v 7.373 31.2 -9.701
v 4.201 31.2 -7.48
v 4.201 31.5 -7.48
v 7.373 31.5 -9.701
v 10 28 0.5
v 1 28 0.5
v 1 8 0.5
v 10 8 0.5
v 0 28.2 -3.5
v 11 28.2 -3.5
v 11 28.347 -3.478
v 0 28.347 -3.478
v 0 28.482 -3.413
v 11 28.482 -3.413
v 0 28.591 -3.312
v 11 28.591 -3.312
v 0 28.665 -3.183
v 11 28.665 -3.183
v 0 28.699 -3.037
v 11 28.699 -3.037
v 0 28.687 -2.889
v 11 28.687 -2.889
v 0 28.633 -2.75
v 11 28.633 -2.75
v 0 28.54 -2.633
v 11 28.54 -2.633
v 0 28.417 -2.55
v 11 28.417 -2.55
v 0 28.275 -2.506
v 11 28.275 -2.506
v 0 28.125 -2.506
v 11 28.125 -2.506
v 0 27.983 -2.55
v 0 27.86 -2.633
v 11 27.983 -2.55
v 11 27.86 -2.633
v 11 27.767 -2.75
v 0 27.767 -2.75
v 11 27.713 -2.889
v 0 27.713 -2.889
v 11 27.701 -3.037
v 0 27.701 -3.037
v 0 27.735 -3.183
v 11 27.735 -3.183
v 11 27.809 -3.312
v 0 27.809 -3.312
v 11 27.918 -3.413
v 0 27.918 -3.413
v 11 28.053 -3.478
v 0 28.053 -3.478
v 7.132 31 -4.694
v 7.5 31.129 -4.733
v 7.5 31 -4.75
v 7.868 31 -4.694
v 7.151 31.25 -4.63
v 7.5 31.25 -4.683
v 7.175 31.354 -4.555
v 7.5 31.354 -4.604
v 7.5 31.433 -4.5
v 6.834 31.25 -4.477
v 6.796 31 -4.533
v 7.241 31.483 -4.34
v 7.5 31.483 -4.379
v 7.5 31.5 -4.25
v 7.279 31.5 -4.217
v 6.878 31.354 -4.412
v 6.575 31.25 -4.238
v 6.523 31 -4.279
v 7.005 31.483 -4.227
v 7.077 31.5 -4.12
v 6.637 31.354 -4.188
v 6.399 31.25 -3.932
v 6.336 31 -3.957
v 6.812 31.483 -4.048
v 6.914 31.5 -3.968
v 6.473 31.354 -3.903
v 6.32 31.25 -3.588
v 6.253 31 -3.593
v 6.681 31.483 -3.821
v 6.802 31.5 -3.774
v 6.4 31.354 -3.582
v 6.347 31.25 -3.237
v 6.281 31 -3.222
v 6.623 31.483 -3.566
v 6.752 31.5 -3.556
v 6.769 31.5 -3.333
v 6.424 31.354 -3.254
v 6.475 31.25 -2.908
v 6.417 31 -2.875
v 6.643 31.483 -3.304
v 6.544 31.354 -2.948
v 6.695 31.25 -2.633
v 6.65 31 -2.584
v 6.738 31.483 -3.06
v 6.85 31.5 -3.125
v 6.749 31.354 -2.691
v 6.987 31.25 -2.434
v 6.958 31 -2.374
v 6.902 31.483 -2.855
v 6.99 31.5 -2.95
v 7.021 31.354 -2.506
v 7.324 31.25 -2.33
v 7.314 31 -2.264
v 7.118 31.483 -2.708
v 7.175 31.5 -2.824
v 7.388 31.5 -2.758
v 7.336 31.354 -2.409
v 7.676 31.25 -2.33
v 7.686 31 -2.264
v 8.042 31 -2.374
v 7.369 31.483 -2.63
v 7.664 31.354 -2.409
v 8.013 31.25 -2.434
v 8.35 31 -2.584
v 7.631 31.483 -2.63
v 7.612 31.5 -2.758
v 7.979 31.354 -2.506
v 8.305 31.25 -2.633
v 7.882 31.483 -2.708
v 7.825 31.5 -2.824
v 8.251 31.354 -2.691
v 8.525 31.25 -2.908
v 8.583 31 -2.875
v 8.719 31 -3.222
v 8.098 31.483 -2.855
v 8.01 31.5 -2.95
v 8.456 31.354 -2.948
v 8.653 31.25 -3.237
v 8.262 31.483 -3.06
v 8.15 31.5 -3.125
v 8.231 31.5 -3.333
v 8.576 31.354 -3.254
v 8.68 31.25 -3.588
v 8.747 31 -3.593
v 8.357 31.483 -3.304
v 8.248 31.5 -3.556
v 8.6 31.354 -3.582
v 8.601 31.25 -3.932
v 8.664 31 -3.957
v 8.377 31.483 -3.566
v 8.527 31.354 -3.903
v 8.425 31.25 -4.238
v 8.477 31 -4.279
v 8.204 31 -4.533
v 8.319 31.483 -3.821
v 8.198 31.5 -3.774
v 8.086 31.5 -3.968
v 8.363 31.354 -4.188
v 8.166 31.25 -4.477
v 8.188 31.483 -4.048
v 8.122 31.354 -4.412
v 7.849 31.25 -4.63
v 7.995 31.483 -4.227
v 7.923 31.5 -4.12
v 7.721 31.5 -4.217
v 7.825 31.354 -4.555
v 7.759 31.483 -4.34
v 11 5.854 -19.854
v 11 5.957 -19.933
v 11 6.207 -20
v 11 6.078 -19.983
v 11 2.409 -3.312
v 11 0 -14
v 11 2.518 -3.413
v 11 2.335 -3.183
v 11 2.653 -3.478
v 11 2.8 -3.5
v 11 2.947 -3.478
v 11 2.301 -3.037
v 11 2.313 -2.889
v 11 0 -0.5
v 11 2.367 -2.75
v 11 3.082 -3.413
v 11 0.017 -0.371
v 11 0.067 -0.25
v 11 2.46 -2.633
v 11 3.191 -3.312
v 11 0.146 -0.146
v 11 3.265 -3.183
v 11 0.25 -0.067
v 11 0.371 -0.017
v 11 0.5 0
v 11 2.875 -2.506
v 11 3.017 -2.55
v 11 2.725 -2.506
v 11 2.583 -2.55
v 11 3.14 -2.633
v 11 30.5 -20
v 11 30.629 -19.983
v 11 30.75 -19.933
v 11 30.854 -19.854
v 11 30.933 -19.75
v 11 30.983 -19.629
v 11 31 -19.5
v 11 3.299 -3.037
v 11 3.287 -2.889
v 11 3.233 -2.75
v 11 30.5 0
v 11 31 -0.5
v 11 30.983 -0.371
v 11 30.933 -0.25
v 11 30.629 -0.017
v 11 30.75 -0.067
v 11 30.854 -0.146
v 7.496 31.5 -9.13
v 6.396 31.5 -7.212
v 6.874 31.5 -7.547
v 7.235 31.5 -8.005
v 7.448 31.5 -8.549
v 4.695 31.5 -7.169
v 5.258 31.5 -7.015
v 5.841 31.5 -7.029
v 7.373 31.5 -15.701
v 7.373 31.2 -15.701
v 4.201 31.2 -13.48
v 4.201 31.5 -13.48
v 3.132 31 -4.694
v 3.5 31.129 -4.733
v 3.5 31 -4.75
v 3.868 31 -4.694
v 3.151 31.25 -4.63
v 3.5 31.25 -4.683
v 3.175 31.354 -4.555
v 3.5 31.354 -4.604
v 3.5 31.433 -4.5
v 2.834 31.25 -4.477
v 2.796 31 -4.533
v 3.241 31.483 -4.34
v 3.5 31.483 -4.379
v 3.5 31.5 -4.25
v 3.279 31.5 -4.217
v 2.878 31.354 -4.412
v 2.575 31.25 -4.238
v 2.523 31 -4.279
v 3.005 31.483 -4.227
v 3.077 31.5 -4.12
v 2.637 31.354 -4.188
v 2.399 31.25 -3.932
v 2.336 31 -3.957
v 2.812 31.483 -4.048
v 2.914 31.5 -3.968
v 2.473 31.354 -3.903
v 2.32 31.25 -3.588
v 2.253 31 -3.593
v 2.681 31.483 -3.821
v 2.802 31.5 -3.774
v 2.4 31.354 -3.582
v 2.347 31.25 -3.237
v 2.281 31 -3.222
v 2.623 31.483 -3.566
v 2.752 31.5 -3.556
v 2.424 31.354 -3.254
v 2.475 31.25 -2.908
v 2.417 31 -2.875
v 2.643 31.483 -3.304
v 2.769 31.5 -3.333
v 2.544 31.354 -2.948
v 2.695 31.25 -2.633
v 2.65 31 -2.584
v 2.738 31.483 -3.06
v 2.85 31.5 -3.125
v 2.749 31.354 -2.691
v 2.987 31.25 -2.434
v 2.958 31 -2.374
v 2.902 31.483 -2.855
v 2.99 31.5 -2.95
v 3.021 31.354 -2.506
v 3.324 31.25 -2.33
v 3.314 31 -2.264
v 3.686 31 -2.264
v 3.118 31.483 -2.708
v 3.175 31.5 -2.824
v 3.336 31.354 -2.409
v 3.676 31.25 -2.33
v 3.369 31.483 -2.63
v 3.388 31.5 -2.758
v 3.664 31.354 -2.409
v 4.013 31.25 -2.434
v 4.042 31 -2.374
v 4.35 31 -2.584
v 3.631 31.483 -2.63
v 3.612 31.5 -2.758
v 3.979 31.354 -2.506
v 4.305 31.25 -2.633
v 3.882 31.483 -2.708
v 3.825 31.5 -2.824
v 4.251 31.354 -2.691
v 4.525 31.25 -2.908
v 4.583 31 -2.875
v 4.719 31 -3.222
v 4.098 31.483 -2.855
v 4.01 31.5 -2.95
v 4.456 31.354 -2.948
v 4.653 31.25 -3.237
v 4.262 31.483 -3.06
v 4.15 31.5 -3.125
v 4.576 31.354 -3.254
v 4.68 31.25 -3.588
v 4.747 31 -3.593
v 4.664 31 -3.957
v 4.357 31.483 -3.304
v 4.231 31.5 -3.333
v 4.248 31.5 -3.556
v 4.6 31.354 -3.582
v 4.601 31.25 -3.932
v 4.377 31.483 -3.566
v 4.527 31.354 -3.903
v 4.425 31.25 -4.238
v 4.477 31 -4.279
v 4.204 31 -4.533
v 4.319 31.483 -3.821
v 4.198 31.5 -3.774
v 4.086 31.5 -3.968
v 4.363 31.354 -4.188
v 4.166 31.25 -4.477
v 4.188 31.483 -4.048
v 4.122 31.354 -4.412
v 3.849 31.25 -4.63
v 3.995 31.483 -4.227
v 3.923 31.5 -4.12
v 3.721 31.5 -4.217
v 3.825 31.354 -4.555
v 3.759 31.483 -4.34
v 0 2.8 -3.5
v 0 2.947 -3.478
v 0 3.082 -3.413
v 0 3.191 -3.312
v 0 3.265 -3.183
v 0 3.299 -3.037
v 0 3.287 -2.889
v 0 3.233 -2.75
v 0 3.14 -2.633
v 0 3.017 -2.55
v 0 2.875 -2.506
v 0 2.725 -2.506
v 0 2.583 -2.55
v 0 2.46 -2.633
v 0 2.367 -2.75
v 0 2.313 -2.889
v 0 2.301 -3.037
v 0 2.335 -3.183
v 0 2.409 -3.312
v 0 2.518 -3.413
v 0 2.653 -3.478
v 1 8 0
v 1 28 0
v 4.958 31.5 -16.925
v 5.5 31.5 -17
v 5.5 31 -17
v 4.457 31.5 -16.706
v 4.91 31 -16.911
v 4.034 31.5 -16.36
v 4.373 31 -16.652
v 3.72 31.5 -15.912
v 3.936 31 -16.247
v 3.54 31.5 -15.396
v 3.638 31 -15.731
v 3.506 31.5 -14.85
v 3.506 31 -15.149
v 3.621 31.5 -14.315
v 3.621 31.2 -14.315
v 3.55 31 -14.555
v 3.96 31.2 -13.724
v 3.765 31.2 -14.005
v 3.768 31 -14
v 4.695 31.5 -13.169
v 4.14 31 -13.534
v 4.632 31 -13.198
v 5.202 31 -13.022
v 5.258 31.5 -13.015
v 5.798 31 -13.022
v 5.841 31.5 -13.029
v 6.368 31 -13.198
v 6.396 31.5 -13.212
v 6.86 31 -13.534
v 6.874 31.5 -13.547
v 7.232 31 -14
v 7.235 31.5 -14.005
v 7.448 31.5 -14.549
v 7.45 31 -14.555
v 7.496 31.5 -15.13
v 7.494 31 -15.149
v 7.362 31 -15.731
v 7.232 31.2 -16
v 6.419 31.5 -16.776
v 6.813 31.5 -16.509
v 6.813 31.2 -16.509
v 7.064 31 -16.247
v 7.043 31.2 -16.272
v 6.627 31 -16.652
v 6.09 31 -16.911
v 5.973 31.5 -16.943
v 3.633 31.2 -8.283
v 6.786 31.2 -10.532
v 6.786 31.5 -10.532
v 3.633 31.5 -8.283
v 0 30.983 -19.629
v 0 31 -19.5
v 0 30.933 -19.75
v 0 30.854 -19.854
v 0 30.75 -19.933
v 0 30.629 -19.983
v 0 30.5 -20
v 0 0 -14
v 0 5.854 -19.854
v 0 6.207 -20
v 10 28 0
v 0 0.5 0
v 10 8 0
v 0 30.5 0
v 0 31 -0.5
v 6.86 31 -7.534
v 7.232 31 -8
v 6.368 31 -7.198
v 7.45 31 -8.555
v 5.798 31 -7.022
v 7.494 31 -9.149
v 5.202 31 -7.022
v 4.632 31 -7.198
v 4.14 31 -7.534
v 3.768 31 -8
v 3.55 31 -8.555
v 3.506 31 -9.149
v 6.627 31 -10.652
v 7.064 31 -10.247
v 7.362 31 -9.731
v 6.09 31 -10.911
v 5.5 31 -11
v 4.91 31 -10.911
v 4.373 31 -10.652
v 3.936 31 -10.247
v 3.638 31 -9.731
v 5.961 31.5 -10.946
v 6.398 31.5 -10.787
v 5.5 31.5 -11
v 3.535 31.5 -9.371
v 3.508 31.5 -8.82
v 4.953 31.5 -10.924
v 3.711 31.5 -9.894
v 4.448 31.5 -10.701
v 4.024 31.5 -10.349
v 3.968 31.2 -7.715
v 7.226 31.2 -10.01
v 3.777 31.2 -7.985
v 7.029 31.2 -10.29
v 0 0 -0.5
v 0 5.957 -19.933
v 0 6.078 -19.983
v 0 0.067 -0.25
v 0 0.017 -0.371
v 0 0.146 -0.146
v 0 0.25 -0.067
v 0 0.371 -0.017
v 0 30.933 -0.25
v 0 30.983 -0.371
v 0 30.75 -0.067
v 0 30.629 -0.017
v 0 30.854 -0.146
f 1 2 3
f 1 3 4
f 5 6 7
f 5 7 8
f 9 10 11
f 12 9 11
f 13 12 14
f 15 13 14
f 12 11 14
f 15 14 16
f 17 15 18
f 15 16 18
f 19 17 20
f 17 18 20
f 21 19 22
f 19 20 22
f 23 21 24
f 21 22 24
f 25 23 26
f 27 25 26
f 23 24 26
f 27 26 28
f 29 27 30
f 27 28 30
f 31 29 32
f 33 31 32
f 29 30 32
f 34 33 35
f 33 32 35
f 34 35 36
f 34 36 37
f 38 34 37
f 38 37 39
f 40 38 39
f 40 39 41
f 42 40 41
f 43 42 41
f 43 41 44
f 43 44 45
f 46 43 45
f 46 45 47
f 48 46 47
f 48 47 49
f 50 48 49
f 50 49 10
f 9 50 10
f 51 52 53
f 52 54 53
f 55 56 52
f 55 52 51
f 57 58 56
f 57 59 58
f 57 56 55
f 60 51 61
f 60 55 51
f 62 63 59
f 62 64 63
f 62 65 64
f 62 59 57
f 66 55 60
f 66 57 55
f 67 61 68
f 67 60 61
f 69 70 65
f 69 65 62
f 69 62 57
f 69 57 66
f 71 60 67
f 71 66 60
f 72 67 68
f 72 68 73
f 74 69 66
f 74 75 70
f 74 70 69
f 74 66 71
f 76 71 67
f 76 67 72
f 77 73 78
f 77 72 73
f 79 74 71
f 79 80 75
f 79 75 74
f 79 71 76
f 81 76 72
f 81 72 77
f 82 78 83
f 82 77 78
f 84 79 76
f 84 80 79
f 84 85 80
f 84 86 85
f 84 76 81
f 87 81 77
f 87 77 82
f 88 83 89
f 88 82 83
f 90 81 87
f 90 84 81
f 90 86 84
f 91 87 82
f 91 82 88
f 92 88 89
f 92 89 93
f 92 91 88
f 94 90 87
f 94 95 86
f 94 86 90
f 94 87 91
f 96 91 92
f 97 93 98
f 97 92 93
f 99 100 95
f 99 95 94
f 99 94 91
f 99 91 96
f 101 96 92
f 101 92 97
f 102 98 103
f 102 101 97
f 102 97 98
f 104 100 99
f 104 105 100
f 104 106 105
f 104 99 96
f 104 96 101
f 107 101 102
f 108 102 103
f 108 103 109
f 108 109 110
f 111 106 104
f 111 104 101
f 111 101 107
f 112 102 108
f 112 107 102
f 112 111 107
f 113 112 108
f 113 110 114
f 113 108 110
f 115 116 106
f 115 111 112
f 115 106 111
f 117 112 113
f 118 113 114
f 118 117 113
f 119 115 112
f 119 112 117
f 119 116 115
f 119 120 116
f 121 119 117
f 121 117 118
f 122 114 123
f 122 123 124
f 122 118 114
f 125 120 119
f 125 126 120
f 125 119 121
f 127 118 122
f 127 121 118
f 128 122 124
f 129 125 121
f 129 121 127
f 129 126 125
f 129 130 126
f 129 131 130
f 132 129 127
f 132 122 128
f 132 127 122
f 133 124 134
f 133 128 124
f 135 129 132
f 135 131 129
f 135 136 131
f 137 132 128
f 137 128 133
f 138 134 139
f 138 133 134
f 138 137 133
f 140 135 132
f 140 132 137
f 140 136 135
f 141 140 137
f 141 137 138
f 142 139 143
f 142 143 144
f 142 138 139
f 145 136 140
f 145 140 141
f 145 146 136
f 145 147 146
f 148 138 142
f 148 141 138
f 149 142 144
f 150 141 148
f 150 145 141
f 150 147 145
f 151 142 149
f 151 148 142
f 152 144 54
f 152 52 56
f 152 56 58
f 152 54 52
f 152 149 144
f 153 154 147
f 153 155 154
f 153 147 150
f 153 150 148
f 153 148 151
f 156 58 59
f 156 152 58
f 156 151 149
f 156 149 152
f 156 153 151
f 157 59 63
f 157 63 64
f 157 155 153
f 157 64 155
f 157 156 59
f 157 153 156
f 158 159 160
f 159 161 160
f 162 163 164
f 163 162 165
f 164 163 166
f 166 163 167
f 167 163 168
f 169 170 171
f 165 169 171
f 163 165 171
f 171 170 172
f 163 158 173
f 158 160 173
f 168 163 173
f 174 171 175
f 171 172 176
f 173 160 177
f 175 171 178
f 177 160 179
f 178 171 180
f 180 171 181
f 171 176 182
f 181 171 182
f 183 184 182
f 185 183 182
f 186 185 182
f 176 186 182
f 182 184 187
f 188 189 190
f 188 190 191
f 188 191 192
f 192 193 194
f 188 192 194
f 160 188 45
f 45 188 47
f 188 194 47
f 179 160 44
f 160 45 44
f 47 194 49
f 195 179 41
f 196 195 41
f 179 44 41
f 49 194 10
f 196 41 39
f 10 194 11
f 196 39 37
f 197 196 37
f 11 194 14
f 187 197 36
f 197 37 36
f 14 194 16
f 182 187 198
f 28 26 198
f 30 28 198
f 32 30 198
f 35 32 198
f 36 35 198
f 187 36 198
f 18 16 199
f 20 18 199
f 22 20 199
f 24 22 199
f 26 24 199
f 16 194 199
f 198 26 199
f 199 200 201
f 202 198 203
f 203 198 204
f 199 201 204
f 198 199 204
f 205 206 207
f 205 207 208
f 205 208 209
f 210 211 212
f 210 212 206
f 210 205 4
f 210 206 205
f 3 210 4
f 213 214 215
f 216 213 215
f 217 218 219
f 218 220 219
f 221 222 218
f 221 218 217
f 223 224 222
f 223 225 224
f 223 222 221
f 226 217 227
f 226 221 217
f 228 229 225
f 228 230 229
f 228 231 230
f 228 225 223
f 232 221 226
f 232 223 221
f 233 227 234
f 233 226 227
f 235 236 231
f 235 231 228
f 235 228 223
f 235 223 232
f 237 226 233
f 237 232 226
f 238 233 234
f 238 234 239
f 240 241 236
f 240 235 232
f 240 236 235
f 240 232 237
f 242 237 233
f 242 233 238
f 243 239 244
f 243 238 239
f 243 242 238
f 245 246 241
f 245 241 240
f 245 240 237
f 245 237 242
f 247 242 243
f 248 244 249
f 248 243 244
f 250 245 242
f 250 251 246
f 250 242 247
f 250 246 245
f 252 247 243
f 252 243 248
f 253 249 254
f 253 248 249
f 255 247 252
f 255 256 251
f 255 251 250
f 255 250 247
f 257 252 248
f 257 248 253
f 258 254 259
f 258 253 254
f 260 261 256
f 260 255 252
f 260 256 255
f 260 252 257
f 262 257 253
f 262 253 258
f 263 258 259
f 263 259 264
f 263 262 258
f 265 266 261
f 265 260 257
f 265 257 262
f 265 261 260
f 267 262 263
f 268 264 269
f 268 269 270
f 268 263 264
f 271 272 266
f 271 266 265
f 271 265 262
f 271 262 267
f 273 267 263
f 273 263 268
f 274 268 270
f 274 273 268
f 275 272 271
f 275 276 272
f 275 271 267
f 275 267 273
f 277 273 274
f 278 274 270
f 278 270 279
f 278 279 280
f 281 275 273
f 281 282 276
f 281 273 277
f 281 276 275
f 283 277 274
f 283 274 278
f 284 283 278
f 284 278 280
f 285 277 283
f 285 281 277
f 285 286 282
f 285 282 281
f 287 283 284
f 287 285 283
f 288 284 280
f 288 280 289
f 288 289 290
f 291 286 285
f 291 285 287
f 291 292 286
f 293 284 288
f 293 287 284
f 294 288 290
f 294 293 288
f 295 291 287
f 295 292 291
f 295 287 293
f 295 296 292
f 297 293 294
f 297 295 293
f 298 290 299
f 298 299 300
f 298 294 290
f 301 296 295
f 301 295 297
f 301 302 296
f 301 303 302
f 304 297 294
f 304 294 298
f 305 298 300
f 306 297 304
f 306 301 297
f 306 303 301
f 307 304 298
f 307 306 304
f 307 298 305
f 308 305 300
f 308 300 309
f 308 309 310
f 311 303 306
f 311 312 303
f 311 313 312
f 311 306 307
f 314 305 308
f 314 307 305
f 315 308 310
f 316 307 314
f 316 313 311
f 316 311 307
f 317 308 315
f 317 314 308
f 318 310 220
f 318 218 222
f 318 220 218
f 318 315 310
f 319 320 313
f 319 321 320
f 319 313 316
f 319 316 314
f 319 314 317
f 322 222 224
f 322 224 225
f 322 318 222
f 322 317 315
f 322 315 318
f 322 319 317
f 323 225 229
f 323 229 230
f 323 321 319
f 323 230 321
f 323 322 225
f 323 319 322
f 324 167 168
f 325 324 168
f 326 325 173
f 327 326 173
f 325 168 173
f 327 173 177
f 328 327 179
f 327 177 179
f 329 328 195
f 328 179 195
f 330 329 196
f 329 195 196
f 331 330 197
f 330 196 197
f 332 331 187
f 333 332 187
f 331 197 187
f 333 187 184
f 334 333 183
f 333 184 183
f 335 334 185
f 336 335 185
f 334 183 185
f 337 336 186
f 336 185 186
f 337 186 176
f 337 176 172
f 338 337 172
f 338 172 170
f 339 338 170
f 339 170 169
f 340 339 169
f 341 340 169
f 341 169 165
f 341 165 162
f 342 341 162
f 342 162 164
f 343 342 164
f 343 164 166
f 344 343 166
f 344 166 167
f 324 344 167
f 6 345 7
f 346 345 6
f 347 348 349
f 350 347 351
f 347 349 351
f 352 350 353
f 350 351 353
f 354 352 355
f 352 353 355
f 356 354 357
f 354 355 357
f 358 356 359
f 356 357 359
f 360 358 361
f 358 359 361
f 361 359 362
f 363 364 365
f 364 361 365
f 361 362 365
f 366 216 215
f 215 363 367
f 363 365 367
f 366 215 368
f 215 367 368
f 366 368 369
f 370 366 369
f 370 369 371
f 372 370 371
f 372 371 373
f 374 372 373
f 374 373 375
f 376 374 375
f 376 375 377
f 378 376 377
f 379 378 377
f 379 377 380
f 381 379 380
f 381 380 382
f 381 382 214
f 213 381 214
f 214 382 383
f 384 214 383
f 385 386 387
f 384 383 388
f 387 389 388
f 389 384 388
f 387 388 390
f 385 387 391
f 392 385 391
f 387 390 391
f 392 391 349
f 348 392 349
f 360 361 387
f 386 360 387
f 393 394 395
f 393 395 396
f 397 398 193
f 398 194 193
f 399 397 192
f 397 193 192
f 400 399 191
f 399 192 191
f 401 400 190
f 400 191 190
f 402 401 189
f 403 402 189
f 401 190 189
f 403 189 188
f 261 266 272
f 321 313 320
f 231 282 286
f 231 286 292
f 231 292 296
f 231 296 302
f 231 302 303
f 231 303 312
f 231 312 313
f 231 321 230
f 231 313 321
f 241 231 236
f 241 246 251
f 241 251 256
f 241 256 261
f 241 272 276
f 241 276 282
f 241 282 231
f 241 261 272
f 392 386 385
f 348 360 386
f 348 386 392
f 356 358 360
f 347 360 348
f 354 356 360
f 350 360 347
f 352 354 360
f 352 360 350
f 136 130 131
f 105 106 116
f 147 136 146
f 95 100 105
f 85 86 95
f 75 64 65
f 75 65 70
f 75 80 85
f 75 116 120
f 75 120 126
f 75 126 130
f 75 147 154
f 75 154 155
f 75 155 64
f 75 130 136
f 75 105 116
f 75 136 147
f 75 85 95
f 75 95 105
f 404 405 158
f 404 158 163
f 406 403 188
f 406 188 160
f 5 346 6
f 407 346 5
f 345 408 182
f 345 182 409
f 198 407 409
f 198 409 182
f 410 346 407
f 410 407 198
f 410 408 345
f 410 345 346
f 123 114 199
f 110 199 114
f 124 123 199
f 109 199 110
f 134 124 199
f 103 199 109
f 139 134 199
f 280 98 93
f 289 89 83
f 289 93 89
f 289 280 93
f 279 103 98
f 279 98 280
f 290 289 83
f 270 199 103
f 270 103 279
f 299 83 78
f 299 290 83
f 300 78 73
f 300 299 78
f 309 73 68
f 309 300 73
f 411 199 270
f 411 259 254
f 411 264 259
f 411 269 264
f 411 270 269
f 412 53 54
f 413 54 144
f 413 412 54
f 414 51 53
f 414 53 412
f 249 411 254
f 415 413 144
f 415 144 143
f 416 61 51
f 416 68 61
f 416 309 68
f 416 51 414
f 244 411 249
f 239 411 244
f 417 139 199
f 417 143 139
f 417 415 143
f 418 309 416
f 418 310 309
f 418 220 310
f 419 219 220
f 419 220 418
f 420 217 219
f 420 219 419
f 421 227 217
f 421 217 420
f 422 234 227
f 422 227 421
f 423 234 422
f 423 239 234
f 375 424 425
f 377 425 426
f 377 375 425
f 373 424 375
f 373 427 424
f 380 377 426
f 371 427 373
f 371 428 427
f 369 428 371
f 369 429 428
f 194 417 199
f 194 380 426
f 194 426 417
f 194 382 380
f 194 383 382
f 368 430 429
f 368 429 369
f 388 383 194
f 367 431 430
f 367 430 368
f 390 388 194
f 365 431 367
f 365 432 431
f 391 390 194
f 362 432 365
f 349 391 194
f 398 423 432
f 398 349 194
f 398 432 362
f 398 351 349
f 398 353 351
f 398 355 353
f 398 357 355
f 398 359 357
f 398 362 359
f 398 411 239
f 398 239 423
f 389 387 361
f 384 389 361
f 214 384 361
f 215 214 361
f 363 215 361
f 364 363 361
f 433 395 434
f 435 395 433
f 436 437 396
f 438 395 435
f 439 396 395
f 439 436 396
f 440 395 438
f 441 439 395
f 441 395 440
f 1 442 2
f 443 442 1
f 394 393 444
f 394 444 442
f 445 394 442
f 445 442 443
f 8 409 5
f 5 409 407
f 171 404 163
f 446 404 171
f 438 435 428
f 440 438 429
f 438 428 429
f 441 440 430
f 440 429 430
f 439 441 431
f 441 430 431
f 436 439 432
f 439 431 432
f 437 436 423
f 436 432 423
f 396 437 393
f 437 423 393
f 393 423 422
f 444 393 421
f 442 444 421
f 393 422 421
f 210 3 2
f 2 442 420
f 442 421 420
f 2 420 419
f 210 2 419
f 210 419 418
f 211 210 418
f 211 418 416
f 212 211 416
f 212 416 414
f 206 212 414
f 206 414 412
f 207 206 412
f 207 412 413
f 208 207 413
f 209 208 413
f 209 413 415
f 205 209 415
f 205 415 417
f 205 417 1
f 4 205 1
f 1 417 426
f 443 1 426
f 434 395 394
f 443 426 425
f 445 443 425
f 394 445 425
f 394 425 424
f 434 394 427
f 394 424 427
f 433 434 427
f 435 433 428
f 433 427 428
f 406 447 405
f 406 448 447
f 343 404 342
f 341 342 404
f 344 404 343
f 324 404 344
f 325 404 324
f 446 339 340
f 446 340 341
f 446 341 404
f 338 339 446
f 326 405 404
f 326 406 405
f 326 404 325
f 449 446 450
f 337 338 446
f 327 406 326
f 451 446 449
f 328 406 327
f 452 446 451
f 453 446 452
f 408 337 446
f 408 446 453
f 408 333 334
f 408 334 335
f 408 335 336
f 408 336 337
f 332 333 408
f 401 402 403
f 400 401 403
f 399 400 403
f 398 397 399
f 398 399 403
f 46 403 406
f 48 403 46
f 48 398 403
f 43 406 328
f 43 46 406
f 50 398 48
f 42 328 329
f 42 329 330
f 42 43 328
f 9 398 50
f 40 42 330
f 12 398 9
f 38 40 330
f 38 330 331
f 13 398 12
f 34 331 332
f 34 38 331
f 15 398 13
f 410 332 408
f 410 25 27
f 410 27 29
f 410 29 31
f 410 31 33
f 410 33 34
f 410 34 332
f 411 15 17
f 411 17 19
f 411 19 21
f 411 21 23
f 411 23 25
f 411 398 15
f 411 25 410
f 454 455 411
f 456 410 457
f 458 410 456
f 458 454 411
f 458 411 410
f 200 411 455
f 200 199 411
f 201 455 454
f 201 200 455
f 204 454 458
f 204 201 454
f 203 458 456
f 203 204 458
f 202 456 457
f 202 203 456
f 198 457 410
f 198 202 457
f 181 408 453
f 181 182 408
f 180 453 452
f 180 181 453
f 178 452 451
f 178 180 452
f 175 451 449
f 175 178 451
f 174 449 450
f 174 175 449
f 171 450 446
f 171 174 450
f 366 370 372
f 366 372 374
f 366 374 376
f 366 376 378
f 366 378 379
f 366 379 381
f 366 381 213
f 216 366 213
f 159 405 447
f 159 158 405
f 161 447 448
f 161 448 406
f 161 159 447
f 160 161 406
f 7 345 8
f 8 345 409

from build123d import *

# Parameters (mm, degrees)
BOSS_EXTRUDE1_DEPTH = 11
SKETCH2_R           = 0.5
CUT_EXTRUDE1_DEPTH  = 39.49675311
SKETCH3_W           = 9
SKETCH3_H           = 20
BOSS_EXTRUDE2_DEPTH = 0.5
SKETCH5_R           = 1.25
SKETCH5_R_2         = 2
BOSS_EXTRUDE3_DEPTH = 0.5
FILLET2_R           = 0.5
FILLET3_R           = 0.5
FILLET4_R           = 0.5
FILLET5_R           = 0.5
FILLET6_R           = 0.5
FILLET7_R           = 0.5
CUT_EXTRUDE3_START  = -0.3
CUT_EXTRUDE3_DEPTH  = 0.3


with BuildPart() as part:
    # Sketch1 → Boss-Extrude1 (new body)
    with BuildSketch(Plane(origin=(0, 0, 0), x_dir=(0, 0, -1), z_dir=(1, 0, 0))):
        Polygon((0, 0), (0, 31), (20, 31), (20, 6), (14, 0), align=None)
    extrude(amount=BOSS_EXTRUDE1_DEPTH)

    # Sketch2 → Cut-Extrude1 (cut, through all)
    with BuildSketch(Plane(origin=(11, 0, 0), x_dir=(0, 0, -1), z_dir=(1, 0, 0))):
        with Locations((3, 2.8)):
            Circle(SKETCH2_R)
        with Locations((3, 28.2)):
            Circle(SKETCH2_R)
    extrude(amount=-CUT_EXTRUDE1_DEPTH, mode=Mode.SUBTRACT)

    # Sketch3 → Boss-Extrude2 (add)
    with BuildSketch(Plane.XY):
        with Locations((5.5, 18)):
            Rectangle(SKETCH3_W, SKETCH3_H)
    extrude(amount=BOSS_EXTRUDE2_DEPTH)

    # Sketch5 → Boss-Extrude3 (add)
    with BuildSketch(Plane(origin=(0, 31, 0), x_dir=(1, 0, 0), z_dir=(0, 1, 0))):
        with Locations(Location((3.5, 3.5, 0), (0, 0, 90))):
            Circle(SKETCH5_R)
        with Locations(Location((7.5, 3.5, 0), (0, 0, 90))):
            Circle(SKETCH5_R)
        with Locations(Location((5.5, 15, 0), (0, 0, 90))):
            Circle(SKETCH5_R_2)
        with Locations(Location((5.5, 9, 0), (0, 0, 90))):
            Circle(SKETCH5_R_2)
    extrude(amount=BOSS_EXTRUDE3_DEPTH)

    # Fillet2
    fillet2_edges = [part.edges().sort_by_distance(p)[0] for p in [
        (3.5, 31.5, -2.25),
    ]]
    fillet(fillet2_edges, radius=FILLET2_R - 0.0001)  # a hair under: the kernel refuses the full size

    # Fillet3
    fillet3_edges = [part.edges().sort_by_distance(p)[0] for p in [
        (7.5, 31.5, -2.25),
    ]]
    fillet(fillet3_edges, radius=FILLET3_R - 0.0001)  # a hair under: the kernel refuses the full size

    # Fillet4
    fillet4_edges = [part.edges().sort_by_distance(p)[0] for p in [
        (5.5, 31, 0),
    ]]
    fillet(fillet4_edges, radius=FILLET4_R)

    # Fillet5
    fillet5_edges = [part.edges().sort_by_distance(p)[0] for p in [
        (5.5, 31, -20),
    ]]
    fillet(fillet5_edges, radius=FILLET5_R)

    # Fillet6
    fillet6_edges = [part.edges().sort_by_distance(p)[0] for p in [
        (5.5, 0, 0),
    ]]
    fillet(fillet6_edges, radius=FILLET6_R)

    # Fillet7
    fillet7_edges = [part.edges().sort_by_distance(p)[0] for p in [
        (5.5, 6, -20),
    ]]
    fillet(fillet7_edges, radius=FILLET7_R)

    # Sketch6 → Cut-Extrude3 (cut)
    with BuildSketch(Plane(origin=(0, 31.5, 0), x_dir=(1, 0, 0), z_dir=(0, 1, 0)).offset(CUT_EXTRUDE3_START)):
        with BuildLine():
            Line((6.786176444, 10.531584197), (3.6331206, 8.282531321))
            ThreePointArc((3.6331206, 8.282531321), (3.86671689, 7.84570962), (4.200507105, 7.479697985))
            Line((4.200507105, 7.479697985), (7.373069331, 9.701149971))
            ThreePointArc((7.373069331, 9.701149971), (7.13328311, 10.15429038), (6.786176444, 10.531584197))
        make_face()
        with BuildLine():
            Line((3.62088338, 14.315222133), (6.812710383, 16.508904056))
            ThreePointArc((6.812710383, 16.508904056), (7.143293876, 16.139993525), (7.373069331, 15.701149971))
            Line((7.373069331, 15.701149971), (4.200507105, 13.479697985))
            ThreePointArc((4.200507105, 13.479697985), (3.856706124, 13.860006475), (3.62088338, 14.315222133))
        make_face()
    extrude(amount=CUT_EXTRUDE3_DEPTH, mode=Mode.SUBTRACT)


solid = part.part
